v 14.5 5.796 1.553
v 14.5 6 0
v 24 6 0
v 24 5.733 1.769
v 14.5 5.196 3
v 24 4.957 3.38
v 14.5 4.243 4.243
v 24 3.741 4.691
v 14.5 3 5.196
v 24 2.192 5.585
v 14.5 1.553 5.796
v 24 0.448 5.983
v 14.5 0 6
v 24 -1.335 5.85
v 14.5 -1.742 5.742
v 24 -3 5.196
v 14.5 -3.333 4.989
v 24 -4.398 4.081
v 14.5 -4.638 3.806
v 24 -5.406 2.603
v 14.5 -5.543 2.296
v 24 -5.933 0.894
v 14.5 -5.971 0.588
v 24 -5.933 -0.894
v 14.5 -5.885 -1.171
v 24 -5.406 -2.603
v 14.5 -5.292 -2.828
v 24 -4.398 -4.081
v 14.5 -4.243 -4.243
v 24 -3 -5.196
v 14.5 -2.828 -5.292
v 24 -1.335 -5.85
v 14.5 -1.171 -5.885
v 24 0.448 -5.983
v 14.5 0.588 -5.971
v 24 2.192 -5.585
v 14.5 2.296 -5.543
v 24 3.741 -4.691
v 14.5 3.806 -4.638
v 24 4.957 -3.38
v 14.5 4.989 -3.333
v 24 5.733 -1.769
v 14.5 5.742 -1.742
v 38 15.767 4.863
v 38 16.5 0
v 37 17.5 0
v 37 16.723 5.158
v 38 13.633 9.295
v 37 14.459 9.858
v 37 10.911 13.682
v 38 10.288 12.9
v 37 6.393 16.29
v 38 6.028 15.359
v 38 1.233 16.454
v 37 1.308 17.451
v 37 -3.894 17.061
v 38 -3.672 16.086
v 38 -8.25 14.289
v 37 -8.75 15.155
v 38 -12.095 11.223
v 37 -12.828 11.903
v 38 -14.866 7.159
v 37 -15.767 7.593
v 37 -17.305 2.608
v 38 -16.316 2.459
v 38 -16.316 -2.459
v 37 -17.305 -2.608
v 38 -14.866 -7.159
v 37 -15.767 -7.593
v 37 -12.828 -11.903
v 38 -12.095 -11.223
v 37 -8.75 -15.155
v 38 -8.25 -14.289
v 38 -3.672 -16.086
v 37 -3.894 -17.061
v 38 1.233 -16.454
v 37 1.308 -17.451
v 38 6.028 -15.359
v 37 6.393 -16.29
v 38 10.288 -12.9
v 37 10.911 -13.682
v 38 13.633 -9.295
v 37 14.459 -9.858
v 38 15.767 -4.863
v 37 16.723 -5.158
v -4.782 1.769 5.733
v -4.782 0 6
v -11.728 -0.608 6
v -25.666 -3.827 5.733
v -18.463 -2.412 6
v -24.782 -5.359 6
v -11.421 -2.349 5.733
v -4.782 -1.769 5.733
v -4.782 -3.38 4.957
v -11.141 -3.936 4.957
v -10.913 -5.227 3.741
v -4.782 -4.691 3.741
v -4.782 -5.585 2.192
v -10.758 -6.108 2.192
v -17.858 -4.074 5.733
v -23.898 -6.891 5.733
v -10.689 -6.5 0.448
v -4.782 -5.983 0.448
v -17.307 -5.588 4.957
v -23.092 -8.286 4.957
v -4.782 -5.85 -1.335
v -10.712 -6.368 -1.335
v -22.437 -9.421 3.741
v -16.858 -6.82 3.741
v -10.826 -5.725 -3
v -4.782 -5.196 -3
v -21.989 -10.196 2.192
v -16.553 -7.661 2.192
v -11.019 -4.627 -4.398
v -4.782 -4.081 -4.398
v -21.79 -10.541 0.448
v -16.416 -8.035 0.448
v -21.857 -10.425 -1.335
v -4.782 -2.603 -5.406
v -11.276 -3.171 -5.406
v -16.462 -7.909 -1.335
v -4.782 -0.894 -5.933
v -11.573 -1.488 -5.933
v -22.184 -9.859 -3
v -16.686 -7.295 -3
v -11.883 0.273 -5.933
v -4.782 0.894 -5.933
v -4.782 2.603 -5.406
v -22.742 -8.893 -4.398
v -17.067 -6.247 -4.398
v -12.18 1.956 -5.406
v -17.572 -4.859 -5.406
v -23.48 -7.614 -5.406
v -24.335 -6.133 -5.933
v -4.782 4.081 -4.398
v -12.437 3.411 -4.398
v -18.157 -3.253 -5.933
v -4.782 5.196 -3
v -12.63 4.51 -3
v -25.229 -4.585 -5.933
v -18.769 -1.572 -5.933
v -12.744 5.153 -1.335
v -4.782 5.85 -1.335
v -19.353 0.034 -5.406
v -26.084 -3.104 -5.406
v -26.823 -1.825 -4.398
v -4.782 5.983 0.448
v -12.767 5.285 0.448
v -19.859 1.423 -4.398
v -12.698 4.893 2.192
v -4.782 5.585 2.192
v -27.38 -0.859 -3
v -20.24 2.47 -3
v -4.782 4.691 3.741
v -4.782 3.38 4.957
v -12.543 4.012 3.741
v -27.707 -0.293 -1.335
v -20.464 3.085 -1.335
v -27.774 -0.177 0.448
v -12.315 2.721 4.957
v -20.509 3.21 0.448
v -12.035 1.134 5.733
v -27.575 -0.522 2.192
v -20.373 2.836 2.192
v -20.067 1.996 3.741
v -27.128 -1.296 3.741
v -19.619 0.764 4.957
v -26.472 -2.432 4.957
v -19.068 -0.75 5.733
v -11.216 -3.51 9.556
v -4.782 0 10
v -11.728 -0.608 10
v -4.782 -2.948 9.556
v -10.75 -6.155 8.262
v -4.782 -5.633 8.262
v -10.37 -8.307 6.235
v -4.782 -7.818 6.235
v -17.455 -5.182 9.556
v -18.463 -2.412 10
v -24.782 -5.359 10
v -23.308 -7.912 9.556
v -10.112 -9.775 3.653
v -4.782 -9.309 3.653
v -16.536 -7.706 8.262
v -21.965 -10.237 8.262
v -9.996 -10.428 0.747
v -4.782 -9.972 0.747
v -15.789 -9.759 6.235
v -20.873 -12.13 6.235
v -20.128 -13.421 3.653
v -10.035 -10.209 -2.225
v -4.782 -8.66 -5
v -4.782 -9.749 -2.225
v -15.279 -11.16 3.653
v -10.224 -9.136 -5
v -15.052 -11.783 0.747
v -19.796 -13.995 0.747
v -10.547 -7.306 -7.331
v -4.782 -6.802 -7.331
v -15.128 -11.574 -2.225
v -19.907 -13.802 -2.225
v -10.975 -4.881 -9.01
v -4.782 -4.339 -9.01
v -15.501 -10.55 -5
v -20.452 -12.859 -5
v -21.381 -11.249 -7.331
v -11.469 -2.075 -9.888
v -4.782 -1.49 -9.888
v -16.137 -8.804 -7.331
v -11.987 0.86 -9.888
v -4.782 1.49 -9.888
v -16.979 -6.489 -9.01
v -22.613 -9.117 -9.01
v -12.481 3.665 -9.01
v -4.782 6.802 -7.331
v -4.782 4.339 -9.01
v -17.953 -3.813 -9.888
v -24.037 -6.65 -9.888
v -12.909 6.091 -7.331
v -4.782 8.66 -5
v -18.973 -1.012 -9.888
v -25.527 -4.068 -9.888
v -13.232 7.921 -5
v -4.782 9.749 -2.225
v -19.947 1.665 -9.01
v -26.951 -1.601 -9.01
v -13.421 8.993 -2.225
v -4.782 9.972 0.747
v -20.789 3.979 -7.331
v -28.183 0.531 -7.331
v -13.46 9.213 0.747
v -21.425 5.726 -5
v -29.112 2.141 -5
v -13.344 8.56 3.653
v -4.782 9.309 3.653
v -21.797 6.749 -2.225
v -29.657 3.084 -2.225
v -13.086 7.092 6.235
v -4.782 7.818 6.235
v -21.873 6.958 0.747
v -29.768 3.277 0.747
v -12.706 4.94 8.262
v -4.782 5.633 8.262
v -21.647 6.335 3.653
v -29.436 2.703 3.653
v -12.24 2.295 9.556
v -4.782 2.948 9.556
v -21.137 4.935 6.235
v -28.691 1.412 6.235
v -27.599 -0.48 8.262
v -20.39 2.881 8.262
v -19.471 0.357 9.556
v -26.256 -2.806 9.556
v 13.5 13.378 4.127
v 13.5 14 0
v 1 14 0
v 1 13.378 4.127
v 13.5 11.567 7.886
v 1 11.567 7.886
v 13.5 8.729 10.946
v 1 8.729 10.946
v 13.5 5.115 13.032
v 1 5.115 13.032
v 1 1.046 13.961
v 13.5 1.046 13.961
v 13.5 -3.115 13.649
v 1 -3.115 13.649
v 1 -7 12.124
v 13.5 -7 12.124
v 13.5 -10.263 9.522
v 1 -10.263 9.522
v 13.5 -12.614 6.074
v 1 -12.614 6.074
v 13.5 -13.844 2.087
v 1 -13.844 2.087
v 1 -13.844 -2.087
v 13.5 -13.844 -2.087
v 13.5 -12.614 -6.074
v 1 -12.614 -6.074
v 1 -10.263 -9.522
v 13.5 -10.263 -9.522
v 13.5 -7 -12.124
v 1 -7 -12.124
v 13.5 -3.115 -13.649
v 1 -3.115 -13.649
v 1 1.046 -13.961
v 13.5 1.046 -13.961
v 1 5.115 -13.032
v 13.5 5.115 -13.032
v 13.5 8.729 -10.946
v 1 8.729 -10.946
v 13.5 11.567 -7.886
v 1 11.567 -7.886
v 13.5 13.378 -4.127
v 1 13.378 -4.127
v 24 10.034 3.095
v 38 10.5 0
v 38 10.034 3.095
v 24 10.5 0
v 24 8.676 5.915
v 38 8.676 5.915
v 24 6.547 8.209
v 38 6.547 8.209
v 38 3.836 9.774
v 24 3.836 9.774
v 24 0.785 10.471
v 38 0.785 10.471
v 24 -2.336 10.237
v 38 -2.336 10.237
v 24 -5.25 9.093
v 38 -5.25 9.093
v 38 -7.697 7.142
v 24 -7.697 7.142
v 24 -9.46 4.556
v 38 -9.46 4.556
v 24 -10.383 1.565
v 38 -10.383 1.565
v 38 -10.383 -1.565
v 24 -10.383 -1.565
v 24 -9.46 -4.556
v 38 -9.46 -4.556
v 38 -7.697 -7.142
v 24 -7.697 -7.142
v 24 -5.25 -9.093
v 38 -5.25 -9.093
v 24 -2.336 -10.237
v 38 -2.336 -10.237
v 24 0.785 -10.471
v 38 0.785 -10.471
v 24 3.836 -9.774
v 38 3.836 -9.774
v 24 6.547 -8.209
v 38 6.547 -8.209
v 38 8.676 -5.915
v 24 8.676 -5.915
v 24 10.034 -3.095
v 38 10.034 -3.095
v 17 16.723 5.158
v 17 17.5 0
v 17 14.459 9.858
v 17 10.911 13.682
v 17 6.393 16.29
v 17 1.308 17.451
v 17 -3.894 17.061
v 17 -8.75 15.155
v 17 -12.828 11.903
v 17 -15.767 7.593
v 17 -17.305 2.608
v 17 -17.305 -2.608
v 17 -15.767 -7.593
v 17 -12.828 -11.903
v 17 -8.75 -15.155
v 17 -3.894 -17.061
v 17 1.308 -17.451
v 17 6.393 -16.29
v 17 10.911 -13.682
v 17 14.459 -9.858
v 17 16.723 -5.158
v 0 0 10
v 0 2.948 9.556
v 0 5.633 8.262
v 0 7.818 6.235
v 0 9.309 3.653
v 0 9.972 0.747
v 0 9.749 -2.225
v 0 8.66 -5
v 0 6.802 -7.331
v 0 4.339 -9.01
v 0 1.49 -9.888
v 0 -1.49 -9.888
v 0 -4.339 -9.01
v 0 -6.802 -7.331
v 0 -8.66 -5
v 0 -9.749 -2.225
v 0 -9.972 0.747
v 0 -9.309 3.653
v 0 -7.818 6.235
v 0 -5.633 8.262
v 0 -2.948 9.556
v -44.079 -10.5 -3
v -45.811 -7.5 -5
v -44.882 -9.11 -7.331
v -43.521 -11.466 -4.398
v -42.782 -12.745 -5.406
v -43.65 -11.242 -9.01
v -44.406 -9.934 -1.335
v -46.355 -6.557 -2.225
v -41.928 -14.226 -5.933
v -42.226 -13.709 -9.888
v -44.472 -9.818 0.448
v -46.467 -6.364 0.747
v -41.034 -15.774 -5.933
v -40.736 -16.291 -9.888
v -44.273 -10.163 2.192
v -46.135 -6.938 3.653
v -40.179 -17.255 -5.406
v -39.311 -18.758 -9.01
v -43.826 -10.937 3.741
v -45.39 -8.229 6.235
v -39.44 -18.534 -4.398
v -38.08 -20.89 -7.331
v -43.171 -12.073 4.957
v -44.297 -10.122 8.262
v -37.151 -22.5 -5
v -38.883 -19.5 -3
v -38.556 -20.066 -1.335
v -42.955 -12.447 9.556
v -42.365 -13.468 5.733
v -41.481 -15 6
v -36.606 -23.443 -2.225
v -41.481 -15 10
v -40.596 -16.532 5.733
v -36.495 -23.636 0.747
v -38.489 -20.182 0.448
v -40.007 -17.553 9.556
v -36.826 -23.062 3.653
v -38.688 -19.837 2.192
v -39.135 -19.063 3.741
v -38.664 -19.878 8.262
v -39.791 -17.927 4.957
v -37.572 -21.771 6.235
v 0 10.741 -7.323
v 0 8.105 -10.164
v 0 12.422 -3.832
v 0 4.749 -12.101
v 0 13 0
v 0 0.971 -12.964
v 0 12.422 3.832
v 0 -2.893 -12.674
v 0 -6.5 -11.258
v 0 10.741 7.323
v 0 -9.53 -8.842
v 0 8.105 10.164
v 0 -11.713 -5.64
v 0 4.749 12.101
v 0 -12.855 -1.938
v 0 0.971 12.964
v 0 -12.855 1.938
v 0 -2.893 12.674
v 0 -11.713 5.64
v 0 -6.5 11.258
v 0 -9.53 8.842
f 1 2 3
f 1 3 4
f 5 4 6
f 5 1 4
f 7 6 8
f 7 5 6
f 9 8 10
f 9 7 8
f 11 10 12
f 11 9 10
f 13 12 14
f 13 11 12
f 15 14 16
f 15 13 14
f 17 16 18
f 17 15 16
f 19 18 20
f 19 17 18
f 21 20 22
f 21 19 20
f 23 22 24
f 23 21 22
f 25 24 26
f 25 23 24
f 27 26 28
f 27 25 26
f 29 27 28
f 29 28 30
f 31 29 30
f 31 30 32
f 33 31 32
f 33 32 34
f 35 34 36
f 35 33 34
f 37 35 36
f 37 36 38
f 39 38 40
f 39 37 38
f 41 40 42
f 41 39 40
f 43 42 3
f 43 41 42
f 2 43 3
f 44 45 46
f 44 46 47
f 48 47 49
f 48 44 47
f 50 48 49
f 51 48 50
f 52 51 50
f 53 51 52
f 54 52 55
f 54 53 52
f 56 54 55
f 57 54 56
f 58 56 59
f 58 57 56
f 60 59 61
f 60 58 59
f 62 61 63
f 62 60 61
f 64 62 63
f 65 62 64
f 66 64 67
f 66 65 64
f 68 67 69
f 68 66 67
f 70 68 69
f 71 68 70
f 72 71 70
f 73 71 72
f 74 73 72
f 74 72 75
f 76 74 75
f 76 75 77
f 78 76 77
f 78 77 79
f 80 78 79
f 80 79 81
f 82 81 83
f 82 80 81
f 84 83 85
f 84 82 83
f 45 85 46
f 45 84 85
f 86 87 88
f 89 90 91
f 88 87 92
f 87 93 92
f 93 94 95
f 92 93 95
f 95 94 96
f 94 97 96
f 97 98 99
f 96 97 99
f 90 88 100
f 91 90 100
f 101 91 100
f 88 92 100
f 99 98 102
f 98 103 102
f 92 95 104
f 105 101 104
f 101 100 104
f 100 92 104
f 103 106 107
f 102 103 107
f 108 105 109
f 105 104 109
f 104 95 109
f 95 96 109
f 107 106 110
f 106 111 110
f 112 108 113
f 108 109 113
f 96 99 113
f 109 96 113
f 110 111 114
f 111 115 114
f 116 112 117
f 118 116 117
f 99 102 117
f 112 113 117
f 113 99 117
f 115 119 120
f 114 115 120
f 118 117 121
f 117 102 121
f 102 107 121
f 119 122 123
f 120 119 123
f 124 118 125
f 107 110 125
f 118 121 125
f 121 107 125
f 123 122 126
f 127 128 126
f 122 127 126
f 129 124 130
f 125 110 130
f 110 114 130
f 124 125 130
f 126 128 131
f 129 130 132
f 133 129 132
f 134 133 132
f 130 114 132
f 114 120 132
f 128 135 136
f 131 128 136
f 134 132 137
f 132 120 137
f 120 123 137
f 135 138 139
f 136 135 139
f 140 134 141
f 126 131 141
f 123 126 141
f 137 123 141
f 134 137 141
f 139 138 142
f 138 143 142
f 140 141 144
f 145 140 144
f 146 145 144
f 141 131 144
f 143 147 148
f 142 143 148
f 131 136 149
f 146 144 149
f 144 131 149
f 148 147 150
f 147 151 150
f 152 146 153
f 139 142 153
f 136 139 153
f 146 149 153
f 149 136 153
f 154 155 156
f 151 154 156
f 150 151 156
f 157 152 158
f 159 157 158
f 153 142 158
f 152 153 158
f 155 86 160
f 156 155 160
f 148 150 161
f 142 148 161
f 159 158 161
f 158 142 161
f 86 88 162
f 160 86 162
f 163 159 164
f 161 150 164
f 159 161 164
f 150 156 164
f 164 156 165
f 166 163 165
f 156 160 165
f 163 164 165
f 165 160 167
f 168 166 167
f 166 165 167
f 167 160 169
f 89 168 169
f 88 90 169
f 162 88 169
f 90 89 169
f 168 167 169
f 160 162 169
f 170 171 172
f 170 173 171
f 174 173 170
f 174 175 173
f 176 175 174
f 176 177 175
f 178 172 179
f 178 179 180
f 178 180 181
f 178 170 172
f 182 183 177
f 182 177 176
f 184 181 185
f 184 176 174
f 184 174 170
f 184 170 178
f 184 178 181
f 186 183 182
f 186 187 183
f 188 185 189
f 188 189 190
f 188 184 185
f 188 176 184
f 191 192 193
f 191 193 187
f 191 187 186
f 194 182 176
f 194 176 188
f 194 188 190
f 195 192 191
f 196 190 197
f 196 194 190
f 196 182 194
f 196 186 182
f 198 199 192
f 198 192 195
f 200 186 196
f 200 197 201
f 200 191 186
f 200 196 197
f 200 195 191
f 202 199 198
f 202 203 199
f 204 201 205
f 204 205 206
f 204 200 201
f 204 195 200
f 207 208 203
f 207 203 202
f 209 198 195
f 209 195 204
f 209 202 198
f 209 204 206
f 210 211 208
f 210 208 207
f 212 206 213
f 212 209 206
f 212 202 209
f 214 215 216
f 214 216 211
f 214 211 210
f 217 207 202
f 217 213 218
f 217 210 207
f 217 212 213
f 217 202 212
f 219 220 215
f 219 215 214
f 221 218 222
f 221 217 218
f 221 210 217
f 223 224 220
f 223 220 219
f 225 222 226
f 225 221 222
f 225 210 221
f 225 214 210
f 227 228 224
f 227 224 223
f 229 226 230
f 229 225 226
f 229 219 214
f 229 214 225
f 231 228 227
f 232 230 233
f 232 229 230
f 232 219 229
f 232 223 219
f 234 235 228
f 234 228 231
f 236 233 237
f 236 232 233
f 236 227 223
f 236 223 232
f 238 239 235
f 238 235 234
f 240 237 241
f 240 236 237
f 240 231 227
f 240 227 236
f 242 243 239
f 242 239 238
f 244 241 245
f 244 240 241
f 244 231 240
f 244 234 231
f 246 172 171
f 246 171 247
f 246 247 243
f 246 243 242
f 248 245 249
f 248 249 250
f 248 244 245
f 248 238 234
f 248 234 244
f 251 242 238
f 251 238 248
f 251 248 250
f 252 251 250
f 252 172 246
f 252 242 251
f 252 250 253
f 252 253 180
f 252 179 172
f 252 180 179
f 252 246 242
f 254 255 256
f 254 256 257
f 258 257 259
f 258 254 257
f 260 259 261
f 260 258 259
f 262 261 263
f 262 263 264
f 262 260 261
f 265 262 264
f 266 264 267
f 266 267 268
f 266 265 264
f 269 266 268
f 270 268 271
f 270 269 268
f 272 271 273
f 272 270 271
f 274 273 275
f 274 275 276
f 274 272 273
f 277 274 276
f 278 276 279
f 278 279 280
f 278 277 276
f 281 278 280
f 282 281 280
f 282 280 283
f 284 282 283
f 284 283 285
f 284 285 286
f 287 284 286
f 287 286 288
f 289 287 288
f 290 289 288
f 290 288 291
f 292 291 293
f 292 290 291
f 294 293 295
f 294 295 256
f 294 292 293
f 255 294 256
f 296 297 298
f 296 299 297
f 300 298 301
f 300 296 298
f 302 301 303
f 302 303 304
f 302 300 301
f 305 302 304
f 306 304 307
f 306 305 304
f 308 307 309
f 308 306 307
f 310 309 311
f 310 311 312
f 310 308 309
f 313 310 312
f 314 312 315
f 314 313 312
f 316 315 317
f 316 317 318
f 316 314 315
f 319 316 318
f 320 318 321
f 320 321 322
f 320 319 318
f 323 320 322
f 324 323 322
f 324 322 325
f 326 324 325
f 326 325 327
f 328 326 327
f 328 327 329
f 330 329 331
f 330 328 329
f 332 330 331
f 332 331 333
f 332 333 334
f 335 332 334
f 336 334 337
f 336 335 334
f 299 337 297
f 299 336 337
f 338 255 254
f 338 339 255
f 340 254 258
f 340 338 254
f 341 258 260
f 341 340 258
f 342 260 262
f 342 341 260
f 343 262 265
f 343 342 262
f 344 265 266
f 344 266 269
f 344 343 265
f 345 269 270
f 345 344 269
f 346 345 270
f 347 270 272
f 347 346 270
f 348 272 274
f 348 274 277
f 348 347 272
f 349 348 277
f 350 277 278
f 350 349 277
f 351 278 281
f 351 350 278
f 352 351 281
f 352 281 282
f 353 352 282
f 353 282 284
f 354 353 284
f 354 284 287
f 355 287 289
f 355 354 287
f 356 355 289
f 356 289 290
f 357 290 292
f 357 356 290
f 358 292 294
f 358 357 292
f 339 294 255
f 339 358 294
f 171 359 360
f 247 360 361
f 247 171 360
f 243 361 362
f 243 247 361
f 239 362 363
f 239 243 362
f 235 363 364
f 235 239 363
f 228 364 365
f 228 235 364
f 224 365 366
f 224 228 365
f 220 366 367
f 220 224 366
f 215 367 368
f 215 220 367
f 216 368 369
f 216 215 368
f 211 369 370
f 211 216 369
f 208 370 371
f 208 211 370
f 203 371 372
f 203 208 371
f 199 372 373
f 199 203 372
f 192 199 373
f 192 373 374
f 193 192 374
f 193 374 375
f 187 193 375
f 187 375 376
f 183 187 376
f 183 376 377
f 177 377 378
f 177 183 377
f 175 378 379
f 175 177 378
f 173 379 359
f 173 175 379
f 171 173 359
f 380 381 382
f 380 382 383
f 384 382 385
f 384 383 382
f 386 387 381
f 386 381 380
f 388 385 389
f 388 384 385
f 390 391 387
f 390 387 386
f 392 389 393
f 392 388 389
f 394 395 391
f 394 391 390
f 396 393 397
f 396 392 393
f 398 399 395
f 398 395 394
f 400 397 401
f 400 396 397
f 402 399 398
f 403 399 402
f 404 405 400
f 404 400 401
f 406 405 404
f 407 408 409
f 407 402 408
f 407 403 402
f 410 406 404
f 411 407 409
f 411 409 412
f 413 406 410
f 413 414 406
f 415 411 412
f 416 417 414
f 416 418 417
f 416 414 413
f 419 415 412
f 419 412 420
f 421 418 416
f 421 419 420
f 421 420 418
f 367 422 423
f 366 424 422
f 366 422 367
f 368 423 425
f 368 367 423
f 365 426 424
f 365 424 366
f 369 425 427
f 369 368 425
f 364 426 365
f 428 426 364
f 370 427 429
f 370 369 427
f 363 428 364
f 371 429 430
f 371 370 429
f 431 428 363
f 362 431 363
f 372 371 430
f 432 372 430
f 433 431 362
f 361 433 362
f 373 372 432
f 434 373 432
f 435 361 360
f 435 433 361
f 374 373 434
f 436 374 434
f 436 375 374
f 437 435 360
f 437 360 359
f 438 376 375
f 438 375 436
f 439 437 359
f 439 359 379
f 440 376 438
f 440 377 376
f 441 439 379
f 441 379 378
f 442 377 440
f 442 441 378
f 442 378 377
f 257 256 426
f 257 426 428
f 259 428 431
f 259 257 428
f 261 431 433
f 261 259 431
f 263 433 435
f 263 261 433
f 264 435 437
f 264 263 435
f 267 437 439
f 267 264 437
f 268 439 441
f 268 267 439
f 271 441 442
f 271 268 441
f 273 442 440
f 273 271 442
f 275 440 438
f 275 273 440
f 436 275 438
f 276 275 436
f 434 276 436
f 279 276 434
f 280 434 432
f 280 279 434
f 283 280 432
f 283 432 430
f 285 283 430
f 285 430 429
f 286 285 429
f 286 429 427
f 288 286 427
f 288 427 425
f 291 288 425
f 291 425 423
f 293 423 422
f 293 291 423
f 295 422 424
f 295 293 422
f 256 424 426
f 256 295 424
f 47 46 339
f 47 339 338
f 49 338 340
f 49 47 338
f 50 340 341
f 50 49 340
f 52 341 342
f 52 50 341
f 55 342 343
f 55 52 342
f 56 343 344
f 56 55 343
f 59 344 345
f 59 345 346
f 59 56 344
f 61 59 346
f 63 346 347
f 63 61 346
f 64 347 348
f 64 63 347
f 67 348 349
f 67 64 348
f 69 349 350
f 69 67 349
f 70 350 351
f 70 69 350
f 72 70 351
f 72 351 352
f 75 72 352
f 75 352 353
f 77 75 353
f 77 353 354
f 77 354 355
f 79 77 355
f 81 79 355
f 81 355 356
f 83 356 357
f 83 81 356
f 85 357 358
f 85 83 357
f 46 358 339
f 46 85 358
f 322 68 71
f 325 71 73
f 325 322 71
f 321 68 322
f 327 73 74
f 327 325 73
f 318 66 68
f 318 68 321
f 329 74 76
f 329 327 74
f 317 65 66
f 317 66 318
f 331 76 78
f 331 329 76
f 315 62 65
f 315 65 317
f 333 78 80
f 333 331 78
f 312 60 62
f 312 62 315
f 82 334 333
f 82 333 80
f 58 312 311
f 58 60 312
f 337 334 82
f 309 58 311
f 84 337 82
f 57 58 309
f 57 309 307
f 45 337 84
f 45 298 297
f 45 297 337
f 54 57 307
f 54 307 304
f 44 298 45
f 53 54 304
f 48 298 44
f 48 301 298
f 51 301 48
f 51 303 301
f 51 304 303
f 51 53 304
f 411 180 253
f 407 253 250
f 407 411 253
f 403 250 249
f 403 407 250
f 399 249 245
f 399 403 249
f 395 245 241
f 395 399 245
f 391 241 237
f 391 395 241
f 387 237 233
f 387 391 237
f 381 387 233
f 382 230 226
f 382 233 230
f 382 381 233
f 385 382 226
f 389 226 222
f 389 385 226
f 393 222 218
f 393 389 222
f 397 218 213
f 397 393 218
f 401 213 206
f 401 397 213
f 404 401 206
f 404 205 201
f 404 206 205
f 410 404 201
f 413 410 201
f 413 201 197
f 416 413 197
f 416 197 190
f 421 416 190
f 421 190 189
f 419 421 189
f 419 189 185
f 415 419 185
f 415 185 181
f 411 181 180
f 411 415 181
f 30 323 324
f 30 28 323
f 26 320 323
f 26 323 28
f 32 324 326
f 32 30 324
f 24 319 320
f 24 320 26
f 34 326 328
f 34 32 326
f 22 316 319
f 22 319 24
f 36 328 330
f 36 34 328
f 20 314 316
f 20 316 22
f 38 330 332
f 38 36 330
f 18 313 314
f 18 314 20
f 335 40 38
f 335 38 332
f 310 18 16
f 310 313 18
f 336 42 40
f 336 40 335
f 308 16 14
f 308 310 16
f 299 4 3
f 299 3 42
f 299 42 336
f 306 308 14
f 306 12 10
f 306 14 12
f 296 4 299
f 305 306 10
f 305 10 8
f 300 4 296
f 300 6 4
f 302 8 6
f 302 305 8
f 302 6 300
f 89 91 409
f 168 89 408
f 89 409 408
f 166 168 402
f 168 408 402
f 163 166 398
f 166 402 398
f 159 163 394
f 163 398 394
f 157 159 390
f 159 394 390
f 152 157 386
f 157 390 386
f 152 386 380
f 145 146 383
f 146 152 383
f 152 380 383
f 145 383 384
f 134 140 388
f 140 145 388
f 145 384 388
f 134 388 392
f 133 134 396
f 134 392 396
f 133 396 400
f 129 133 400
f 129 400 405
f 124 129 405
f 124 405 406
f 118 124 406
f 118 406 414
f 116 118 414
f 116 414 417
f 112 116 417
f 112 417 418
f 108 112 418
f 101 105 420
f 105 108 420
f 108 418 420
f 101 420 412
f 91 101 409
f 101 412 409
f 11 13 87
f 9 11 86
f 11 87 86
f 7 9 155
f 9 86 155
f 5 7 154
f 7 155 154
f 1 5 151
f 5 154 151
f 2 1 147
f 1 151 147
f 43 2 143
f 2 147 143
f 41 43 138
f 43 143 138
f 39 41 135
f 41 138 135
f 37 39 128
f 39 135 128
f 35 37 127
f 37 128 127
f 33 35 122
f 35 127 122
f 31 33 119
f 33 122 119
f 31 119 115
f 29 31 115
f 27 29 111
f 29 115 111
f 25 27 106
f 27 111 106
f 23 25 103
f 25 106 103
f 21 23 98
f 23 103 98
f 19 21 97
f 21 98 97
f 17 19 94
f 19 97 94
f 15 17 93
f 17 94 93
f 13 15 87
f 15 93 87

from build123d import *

# Parameters (mm, degrees)
CHAMFER1_SIZE = 1
SKETCH2_R     = 10
SKETCH2_R_2   = 6


with BuildPart() as part:
    # Sketch1 → Revolve1 (revolve)
    with BuildSketch(Plane.XY):
        Polygon((0, 10), (0, 14), (13.5, 14), (17, 17.5), (38, 17.5), (38, 10.5), (24, 10.5), (24, 6), (14.5, 6), (14.5, 10), align=None)
    revolve(axis=Axis((0, 0, 0), (1, 0, 0)))

    # Chamfer1
    chamfer1_edges = [part.edges().sort_by_distance(p)[0] for p in [
        (38, -17.5, 0),
        (0, -14, 0),
    ]]
    chamfer(chamfer1_edges, length=CHAMFER1_SIZE)

    # Sweep6: sweep along a path in Sketch3
    with BuildLine(Plane.XY) as sweep6_path:
        Line((14.5, 0), (-4.782032303, 0))
        ThreePointArc((-4.782032303, 0), (-15.134794107, -1.362966948), (-24.782032303, -5.358983849))
        Line((-24.782032303, -5.358983849), (-41.480762114, -15))
    # Sketch2 → Sweep6 (sweep)
    with BuildSketch(Plane.ZY.offset(-14.5)):
        Circle(SKETCH2_R)
        Circle(SKETCH2_R_2, mode=Mode.SUBTRACT)
    sweep(path=sweep6_path.line)


solid = part.part
